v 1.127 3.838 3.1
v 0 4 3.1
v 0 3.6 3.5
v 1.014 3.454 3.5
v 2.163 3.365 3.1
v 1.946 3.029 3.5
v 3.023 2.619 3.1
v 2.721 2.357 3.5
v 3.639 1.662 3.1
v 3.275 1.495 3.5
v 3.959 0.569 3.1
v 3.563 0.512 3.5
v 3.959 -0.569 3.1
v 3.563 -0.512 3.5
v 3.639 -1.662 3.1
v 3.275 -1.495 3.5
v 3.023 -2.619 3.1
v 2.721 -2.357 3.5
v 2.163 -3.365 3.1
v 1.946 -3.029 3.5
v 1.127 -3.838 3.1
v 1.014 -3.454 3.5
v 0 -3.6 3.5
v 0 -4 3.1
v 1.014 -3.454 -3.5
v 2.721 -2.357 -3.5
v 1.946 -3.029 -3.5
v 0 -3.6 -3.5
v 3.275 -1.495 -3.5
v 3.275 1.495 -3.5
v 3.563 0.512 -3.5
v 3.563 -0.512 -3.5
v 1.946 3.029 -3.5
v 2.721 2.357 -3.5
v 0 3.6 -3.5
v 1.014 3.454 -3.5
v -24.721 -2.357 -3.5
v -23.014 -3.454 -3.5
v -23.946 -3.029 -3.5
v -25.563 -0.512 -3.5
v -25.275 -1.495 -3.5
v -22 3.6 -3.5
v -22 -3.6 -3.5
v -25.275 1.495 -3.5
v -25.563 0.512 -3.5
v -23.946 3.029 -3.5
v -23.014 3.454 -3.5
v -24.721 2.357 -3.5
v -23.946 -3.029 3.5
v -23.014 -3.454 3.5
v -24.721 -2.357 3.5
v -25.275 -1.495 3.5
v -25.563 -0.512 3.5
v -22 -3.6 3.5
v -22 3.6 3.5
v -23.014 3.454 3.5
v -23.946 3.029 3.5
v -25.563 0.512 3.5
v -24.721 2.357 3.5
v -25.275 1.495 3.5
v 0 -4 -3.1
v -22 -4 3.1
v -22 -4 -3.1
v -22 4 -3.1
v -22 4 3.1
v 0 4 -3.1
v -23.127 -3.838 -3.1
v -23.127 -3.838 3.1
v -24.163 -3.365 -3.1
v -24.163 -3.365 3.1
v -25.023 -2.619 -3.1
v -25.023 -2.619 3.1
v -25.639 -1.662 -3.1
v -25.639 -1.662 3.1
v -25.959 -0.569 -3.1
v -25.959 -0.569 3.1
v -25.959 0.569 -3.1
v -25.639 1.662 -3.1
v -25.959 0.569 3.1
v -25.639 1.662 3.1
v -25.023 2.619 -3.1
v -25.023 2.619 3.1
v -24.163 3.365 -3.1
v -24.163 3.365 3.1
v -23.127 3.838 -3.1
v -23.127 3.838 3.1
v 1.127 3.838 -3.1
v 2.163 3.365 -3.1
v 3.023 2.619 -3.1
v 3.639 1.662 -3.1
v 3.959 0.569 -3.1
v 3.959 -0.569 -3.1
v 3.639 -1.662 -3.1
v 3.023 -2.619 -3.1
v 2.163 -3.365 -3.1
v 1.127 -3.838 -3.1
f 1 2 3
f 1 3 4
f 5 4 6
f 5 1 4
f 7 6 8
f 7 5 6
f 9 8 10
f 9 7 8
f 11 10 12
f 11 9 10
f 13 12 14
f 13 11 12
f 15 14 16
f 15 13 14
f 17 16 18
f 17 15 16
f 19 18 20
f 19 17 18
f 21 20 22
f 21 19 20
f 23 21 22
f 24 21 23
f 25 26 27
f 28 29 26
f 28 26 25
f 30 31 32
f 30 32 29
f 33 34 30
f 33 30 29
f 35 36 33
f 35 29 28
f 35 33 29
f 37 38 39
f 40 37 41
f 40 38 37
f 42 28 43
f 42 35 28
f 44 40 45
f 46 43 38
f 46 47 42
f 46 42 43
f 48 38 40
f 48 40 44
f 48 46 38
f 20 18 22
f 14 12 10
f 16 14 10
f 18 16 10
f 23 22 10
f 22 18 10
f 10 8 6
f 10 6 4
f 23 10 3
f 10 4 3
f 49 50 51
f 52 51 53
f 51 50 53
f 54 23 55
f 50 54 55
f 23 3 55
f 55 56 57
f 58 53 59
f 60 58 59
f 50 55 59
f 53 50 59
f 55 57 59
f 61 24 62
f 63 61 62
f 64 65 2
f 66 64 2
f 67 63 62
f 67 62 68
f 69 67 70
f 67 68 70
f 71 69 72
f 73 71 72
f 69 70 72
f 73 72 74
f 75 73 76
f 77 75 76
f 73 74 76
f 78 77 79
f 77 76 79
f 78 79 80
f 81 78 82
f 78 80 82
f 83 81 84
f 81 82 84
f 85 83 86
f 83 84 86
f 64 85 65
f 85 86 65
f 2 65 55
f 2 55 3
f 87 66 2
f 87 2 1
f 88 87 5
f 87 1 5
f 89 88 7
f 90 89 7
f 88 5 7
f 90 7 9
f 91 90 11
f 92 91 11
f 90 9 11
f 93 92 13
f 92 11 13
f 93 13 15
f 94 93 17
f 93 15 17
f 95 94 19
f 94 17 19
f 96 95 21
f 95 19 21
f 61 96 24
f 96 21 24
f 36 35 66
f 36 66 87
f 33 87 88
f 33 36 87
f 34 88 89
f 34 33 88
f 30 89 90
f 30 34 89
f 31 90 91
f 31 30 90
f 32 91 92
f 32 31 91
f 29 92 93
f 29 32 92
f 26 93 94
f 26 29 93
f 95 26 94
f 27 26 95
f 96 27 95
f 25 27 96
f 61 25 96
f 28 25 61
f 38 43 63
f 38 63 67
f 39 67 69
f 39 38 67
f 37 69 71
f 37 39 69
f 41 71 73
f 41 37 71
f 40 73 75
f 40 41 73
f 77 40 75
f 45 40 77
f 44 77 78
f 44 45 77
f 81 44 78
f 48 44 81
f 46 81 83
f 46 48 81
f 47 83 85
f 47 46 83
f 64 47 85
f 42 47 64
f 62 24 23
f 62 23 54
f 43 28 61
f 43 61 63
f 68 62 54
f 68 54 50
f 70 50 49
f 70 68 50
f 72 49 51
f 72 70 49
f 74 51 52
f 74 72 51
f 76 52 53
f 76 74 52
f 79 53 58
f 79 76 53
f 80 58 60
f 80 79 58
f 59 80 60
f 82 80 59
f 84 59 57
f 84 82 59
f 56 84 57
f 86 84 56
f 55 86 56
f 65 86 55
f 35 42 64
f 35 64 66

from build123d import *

# Parameters (mm, degrees)
BASEKEY_DEPTH = 3.5
CHAMFER1_SIZE = 0.4


with BuildPart() as part:
    # Sketch1 → BaseKey (new body, symmetric)
    with BuildSketch(Plane.XY):
        with BuildLine():
            Line((-22, 4), (0, 4))
            ThreePointArc((0, 4), (4, 0), (0, -4))
            Line((0, -4), (-22, -4))
            ThreePointArc((-22, -4), (-26, 0), (-22, 4))
        make_face()
    extrude(amount=BASEKEY_DEPTH, both=True)

    # Chamfer1
    chamfer1_edges = [part.edges().sort_by_distance(p)[0] for p in [
        (4, 0, 3.5),
        (-11, 4, 3.5),
        (-26, 0, 3.5),
        (-11, 4, -3.5),
        (4, 0, -3.5),
        (-11, -4, -3.5),
        (-26, 0, -3.5),
        (-11, -4, 3.5),
    ]]
    chamfer(chamfer1_edges, length=CHAMFER1_SIZE)


solid = part.part
